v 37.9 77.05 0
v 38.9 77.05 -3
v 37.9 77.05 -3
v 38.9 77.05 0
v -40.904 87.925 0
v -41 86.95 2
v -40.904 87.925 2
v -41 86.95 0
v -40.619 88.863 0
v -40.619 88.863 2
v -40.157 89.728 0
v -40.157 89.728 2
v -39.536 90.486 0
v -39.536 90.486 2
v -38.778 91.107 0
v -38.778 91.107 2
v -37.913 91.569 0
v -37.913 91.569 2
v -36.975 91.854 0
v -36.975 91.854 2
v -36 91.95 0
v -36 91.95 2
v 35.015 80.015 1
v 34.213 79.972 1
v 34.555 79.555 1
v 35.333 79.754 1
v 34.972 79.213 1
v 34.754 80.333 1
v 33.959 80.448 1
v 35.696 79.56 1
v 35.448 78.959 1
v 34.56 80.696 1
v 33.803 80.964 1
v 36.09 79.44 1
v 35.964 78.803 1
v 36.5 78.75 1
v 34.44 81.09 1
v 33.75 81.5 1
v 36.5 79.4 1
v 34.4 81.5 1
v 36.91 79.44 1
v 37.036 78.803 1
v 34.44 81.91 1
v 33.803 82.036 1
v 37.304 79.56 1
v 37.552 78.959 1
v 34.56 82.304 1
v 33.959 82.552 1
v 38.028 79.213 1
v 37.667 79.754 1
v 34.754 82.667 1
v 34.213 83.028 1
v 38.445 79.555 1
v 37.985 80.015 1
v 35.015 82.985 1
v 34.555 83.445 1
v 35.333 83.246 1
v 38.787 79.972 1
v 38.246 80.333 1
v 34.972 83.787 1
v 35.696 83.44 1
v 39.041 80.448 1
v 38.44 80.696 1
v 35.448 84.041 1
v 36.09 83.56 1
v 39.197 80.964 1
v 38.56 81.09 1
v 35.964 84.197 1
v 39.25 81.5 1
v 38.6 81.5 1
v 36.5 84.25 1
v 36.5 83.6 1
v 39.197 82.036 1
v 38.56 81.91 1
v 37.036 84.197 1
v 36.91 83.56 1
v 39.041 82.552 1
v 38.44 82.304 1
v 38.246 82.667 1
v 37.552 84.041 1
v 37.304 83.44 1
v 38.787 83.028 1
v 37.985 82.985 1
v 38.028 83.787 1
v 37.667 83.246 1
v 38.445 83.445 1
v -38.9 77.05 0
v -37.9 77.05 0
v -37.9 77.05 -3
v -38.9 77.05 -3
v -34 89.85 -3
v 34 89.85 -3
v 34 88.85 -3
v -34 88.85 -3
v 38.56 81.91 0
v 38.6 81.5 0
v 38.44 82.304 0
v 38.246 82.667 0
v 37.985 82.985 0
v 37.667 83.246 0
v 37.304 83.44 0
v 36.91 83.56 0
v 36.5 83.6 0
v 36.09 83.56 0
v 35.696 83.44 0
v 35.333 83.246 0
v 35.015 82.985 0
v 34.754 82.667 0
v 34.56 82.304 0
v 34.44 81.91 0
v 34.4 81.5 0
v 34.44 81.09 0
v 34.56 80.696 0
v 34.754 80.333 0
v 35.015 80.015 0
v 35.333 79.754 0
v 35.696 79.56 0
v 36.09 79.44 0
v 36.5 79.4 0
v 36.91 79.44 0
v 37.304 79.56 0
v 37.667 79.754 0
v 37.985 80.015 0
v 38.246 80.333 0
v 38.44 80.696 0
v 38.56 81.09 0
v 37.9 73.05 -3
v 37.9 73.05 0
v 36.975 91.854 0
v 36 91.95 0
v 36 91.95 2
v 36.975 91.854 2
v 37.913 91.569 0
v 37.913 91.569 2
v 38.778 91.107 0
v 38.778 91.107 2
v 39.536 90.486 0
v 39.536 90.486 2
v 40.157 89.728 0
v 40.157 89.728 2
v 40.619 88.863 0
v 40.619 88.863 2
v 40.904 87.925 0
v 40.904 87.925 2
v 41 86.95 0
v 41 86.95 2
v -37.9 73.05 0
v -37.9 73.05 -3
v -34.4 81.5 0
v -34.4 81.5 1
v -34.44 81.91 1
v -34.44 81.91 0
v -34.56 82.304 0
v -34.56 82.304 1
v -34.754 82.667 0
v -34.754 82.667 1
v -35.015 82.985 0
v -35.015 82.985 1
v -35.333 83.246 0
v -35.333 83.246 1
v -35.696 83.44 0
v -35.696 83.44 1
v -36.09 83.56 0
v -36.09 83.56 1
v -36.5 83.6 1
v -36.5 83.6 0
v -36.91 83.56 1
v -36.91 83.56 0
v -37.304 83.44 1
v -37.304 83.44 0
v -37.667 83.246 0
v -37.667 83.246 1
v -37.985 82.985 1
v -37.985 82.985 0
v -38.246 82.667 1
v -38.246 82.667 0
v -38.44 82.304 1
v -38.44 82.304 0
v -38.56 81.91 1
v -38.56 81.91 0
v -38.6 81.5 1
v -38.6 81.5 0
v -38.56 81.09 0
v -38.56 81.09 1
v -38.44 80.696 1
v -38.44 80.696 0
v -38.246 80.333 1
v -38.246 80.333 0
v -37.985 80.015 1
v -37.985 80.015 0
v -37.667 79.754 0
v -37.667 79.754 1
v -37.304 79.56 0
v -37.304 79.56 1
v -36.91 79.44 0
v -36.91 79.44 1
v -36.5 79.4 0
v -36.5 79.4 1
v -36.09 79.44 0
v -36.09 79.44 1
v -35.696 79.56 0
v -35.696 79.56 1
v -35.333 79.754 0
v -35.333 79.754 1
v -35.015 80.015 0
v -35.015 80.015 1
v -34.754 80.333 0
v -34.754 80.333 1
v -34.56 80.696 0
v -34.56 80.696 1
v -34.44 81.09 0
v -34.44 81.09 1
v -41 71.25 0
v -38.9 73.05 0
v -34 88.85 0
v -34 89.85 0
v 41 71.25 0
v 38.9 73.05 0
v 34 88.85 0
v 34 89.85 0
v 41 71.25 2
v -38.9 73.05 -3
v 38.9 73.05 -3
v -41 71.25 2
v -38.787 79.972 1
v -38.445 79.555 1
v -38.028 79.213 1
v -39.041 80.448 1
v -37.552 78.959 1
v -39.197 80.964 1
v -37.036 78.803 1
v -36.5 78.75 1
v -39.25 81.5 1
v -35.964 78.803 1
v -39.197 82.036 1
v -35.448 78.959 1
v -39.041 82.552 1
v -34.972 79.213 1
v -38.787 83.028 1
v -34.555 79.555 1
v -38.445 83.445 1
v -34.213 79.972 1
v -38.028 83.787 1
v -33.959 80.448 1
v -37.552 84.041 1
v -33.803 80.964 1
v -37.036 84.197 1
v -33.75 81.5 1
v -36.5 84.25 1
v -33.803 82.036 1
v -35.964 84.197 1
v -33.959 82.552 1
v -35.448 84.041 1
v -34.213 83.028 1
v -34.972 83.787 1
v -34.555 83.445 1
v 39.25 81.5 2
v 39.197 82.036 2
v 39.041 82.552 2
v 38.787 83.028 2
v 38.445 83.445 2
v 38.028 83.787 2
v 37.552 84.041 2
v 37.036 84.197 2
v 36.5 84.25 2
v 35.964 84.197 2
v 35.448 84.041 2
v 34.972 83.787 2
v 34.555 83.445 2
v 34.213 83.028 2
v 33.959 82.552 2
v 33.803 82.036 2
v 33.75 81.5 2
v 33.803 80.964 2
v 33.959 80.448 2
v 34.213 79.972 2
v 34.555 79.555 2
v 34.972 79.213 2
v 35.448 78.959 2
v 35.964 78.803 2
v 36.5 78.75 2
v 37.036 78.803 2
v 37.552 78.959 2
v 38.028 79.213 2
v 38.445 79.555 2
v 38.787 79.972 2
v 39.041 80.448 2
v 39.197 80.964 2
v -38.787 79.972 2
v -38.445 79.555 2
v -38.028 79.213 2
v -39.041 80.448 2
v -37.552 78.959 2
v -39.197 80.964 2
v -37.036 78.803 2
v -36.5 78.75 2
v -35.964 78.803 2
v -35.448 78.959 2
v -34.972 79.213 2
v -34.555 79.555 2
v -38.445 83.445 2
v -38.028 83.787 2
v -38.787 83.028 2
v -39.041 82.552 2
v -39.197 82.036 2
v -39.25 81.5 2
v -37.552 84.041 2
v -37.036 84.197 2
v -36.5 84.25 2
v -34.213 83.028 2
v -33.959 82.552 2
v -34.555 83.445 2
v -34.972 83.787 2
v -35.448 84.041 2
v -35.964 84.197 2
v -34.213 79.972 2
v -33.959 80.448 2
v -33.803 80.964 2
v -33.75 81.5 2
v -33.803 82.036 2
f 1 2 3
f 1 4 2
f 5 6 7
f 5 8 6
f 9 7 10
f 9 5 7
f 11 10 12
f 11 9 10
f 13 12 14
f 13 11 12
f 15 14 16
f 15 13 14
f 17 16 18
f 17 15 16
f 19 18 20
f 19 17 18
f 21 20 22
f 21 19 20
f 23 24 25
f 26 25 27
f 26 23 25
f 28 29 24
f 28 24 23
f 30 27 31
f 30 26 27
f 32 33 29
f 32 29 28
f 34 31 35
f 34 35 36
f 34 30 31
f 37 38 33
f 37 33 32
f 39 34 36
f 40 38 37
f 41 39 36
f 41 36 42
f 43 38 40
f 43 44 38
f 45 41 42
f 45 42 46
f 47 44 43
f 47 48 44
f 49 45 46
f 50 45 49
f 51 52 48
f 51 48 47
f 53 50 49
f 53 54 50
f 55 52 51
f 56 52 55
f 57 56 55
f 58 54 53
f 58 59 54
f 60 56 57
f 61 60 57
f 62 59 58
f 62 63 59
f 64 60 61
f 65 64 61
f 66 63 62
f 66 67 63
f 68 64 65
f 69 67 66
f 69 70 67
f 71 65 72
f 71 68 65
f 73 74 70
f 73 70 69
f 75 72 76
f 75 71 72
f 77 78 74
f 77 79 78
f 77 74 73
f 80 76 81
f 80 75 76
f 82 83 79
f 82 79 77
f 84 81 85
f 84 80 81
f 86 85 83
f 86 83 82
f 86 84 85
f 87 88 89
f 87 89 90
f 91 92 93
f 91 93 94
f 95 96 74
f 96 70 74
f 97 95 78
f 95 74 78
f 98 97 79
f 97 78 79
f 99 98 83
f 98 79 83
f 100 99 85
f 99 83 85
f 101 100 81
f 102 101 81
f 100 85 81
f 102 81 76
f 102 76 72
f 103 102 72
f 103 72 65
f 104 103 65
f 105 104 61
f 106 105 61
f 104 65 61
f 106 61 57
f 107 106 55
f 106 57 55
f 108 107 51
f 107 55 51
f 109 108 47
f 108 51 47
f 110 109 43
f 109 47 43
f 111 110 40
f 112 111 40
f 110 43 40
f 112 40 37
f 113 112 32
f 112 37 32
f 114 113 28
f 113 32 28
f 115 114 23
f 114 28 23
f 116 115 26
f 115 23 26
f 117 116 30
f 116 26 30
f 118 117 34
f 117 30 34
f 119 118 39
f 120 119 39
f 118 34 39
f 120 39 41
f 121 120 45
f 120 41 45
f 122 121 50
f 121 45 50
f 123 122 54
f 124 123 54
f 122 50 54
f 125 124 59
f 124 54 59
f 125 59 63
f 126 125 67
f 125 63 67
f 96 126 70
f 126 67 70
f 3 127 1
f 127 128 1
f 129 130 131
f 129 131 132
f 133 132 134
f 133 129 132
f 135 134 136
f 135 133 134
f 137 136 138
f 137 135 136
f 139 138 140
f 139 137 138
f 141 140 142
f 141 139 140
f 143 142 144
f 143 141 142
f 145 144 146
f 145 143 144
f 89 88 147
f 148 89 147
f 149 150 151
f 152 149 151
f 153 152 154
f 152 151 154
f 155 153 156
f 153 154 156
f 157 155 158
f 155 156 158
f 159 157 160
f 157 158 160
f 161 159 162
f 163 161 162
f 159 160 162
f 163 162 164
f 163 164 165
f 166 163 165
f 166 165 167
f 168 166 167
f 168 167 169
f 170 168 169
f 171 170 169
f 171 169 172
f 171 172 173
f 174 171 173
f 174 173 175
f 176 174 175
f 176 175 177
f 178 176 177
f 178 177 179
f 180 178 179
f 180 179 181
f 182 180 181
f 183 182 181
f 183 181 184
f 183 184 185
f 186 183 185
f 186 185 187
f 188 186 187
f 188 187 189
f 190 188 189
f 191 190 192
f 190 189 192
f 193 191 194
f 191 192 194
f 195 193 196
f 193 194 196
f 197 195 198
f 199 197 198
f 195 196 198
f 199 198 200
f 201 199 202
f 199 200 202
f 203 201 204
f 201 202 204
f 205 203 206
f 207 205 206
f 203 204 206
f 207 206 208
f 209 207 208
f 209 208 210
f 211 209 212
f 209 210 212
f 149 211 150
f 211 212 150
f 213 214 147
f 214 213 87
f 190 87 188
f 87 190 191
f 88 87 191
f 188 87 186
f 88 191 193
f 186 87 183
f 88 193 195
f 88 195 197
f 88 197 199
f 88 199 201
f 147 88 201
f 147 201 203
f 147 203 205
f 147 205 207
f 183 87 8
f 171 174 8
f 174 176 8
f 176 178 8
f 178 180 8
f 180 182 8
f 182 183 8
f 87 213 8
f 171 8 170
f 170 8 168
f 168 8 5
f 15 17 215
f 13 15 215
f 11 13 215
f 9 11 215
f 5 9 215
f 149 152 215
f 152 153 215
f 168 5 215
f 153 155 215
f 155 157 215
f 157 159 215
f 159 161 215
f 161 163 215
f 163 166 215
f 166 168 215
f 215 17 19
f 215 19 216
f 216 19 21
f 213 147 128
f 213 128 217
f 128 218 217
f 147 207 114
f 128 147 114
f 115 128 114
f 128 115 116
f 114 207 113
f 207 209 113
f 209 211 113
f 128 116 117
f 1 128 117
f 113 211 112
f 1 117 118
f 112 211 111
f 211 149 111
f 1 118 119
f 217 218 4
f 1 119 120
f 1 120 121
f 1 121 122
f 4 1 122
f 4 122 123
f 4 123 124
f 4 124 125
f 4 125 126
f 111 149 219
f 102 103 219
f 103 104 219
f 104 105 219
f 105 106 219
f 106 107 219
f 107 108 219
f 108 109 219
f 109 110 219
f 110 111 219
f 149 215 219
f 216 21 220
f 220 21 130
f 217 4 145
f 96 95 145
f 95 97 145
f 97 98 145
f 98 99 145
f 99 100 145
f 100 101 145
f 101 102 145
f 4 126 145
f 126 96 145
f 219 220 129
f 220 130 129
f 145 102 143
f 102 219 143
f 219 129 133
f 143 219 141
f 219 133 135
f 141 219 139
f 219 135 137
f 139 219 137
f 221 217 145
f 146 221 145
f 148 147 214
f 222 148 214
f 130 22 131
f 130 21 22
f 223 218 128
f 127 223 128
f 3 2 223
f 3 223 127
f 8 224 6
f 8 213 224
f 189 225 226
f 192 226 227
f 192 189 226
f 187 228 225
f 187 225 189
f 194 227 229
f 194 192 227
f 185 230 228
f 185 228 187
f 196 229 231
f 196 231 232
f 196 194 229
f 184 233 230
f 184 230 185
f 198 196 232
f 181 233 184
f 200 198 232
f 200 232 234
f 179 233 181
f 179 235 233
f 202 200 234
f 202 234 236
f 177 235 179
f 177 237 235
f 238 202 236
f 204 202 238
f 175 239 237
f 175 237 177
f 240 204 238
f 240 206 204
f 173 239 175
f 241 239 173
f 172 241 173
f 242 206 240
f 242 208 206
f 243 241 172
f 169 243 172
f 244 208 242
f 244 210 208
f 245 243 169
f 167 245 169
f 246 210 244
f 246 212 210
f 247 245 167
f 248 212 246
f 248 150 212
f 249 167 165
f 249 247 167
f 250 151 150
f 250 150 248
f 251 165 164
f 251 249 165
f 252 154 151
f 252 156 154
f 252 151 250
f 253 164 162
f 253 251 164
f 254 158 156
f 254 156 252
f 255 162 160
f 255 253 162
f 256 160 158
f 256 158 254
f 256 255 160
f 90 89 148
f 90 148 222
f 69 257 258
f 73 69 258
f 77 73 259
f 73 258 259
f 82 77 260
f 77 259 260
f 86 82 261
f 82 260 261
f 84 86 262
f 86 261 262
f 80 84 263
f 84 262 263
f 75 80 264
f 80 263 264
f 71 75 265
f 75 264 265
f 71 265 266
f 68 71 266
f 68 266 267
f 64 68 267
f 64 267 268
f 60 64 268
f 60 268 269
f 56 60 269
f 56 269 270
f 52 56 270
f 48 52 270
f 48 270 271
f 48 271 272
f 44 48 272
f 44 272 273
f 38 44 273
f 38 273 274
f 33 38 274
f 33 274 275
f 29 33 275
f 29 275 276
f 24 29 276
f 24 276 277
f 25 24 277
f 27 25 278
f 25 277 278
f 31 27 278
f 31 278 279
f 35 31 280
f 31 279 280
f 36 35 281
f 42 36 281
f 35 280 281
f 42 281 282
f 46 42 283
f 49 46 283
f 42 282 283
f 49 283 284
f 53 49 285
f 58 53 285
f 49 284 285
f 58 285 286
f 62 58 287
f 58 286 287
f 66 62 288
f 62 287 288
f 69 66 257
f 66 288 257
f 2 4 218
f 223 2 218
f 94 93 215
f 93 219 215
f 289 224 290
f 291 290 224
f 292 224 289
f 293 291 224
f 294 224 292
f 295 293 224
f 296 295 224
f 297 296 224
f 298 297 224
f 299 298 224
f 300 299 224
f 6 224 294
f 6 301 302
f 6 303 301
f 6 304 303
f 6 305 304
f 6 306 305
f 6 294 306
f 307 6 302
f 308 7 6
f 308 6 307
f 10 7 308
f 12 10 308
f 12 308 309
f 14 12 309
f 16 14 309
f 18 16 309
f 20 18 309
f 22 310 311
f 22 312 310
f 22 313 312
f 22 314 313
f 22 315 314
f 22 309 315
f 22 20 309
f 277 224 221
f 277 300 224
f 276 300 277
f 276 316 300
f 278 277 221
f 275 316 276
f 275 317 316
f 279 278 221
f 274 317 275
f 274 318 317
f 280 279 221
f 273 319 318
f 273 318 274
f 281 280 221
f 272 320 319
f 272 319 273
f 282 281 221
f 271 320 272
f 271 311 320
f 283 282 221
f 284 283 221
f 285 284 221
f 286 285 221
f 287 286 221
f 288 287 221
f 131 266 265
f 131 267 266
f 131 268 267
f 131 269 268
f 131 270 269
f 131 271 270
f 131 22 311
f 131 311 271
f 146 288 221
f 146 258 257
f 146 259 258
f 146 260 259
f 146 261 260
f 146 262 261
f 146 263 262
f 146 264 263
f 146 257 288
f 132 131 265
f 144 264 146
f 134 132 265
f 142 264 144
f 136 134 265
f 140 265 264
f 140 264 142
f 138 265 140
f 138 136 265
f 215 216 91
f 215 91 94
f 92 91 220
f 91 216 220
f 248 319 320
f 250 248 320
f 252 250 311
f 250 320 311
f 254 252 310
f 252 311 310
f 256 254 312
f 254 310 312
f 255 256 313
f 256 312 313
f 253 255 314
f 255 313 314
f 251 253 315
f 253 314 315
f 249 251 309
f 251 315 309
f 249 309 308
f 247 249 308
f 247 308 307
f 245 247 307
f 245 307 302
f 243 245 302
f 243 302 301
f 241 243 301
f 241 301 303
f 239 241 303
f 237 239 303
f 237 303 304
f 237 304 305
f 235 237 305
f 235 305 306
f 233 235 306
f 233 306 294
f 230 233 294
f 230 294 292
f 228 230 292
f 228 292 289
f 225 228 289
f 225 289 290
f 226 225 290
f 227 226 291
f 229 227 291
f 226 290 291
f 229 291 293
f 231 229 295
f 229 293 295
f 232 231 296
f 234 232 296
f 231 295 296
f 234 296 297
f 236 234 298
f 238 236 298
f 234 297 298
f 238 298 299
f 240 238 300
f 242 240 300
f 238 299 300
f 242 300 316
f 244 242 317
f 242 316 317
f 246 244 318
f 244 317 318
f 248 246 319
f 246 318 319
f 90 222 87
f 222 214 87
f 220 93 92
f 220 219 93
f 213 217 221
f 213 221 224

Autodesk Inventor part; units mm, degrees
ref_plane "YZ Plane" through (0, 0, 0) normal (1, 0, 0) x (0, 1, 0)
ref_plane "XZ Plane" through (0, 0, 0) normal (0, 1, 0) x (-1, 0, 0)
ref_plane "XY Plane" through (0, 0, 0) normal (0, 0, 1) x (1, 0, 0)
sketch "Sketch1" plane through (0, 0, 0) normal (0, 0, 1) x (1, 0, 0)
  circle A0 centre (0.25, 36.05) radius 28 projected
  line L0 (-21, -56.05) -> (-21, -1.05) projected
  line L1 (-21, -1.05) -> (21.5, -1.05) projected
  line L2 (21.5, -1.05) -> (21.5, -56.05) projected
  line L3 (21.5, -56.05) -> (-21, -56.05) projected
  arc A1 (-41, -66.05) -> (-36, -71.05) centre (-36, -66.05) ccw projected
  line L4 (-36, -71.05) -> (36, -71.05) projected
  arc A2 (36, -71.05) -> (41, -66.05) centre (36, -66.05) ccw projected
  line L5 (41, -66.05) -> (41, 71.05) projected
  line L6 (41, 71.05) -> (-41, 71.05) projected
  line L7 (-41, 71.05) -> (-41, -66.05) projected
  line L8 (20, 69.05) -> (20, 73.05) projected
  line L9 (20, 69.05) -> (33.3542, 69.05) projected
  arc A3 (33.3542, 69.05) -> (39, 63.4042) centre (36, 66.05) ccw projected
  line L10 (39, 63.4042) -> (39, -63.4042) projected
  arc A4 (39, -63.4042) -> (33.3542, -69.05) centre (36, -66.05) ccw projected
  line L11 (33.3542, -69.05) -> (-33.3542, -69.05) projected
  arc A5 (-33.3542, -69.05) -> (-39, -63.4042) centre (-36, -66.05) ccw projected
  line L12 (-39, -63.4042) -> (-39, 63.4042) projected
  arc A6 (-39, 63.4042) -> (-33.3542, 69.05) centre (-36, 66.05) ccw projected
  line L13 (-33.3542, 69.05) -> (-20, 69.05) projected
  line L14 (-20, 69.05) -> (-20, 73.05) projected
  line L15 (-39, 73.05) -> (-20, 73.05) projected
  line L16 (-39, 79.0505) -> (-39, 73.05) projected
  arc A7 (-34, 89.95) -> (-39, 84.95) centre (-34, 84.95) ccw projected
  line L17 (34, 89.95) -> (-34, 89.95) projected
  arc A8 (39, 84.95) -> (34, 89.95) centre (34, 84.95) ccw projected
  line L18 (39, 73.05) -> (39, 79.0505) projected
  line L19 (20, 73.05) -> (39, 73.05) projected
  line L20 (41, -66.05) -> (41, 86.95) projected
  arc A9 (41, 86.95) -> (36, 91.95) centre (36, 86.95) ccw projected
  line L21 (-36, 91.95) -> (36, 91.95) projected
  arc A10 (-36, 91.95) -> (-41, 86.95) centre (-36, 86.95) ccw projected
  line L22 (-41, -66.05) -> (-41, 86.95) projected
  arc A11 (-41, -66.05) -> (-36, -71.05) centre (-36, -66.05) ccw projected
  line L23 (-36, -71.05) -> (36, -71.05) projected
  arc A12 (36, -71.05) -> (41, -66.05) centre (36, -66.05) ccw projected
  circle A13 centre (-36, -66.05) radius 2.1 projected
  line L24 (38.6458, 69.05) -> (39, 69.05) projected
  line L25 (39, 69.05) -> (39, 68.6958) projected
  arc A14 (39, 68.6958) -> (38.6458, 69.05) centre (36, 66.05) ccw projected
  circle A15 centre (36, 66.05) radius 2.1 projected
  line L26 (39, -68.6958) -> (39, -69.05) projected
  line L27 (39, -69.05) -> (38.6458, -69.05) projected
  arc A16 (38.6458, -69.05) -> (39, -68.6958) centre (36, -66.05) ccw projected
  circle A17 centre (36, -66.05) radius 2.1 projected
  arc A18 (-39, -68.6958) -> (-38.6458, -69.05) centre (-36, -66.05) ccw projected
  line L28 (-38.6458, -69.05) -> (-39, -69.05) projected
  line L29 (-39, -69.05) -> (-39, -68.6958) projected
  circle A19 centre (-36, 66.05) radius 2.1 projected
  arc A20 (-38.6458, 69.05) -> (-39, 68.6958) centre (-36, 66.05) ccw projected
  line L30 (-39, 68.6958) -> (-39, 69.05) projected
  line L31 (-39, 69.05) -> (-38.6458, 69.05) projected
  line L32 (41, 71.25) -> (-41, 71.25)
  circle A21 centre (-36.5, 81.5) radius 2.1 projected
  circle A22 centre (36.5, 81.5) radius 2.1 projected
  arc A23 (-39, 79.0505) -> (-39, 83.9495) centre (-36.5, 81.5) ccw projected
  line L33 (-39, 84.95) -> (-39, 83.9495) projected
  line L34 (39, 83.9495) -> (39, 84.95) projected
  arc A24 (39, 83.9495) -> (39, 79.0505) centre (36.5, 81.5) ccw projected
  point P0 (0, 0)
  dimension "d0" = 0.2
extrude "Extrusion1" add sketch "Sketch1" along normal blind 2 contours L22 A10 L21 A9 L20 L32 L8 L19 L18 A24 L34 A8 L17 A7 L33 A23 L16 L15 L14 | L14 L15 L16 A23 L33 A7 L17 A8 L34 A24 L18 L19 L8 L32 | A21 | A22
sketch "Sketch2" plane through (0, 0, 0) normal (0, 0, -1) x (-1, 0, 0)
  arc A0 (-34, 89.95) -> (-39, 79.0505) centre (-34, 84.95) ccw projected
  line L0 (-34, 89.95) -> (34, 89.95) projected
  arc A1 (39, 79.0505) -> (34, 89.95) centre (34, 84.95) ccw projected
  line L1 (39, 79.0505) -> (39, 73.05) projected
  line L2 (-39, 73.05) -> (-39, 79.0505) projected
  line L3 (38.9, 73.05) -> (38.9, 84.95)
  arc A2 (38.9, 84.95) -> (34, 89.85) centre (34, 84.95) ccw
  line L4 (34, 89.85) -> (-34, 89.85)
  arc A3 (-34, 89.85) -> (-38.9, 84.95) centre (-34, 84.95) ccw
  line L5 (-38.9, 84.95) -> (-38.9, 73.05)
  line L6 (-37.9, 73.05) -> (-37.9, 84.95)
  arc A4 (-34, 88.85) -> (-37.9, 84.95) centre (-34, 84.95) ccw
  line L7 (-34, 88.85) -> (34, 88.85)
  arc A5 (37.9, 84.95) -> (34, 88.85) centre (34, 84.95) ccw
  line L8 (37.9, 84.95) -> (37.9, 73.05)
  line L9 (-38.9, 73.05) -> (-37.9, 73.05)
  line L10 (37.9, 73.05) -> (38.9, 73.05)
  line L11 (41, 71.25) -> (-41, 71.25) projected
  arc A6 (-34, 89.95) -> (-39, 84.95) centre (-34, 84.95) ccw projected
  line L12 (-34, 89.95) -> (34, 89.95) projected
  circle A7 centre (-36.5, 81.5) radius 2.1 projected
  arc A8 (-39, 79.0505) -> (-39, 83.9495) centre (-36.5, 81.5) ccw projected
  circle A9 centre (36.5, 81.5) radius 2.1 projected
  arc A10 (39, 83.9495) -> (39, 79.0505) centre (36.5, 81.5) ccw projected
  arc A11 (-36, 91.95) -> (-41, 86.95) centre (-36, 86.95) ccw projected
  line L13 (-41, 71.25) -> (-41, 86.95) projected
  line L14 (-34, 88.85) -> (-34, 89.95)
  line L15 (-38.9, 77.05) -> (38.9, 77.05)
  line L16 (34, 89.95) -> (34, 88.85)
  point P0 (0, 0)
  point P1 (-38.4, 73.05)
  point P2 (38.4, 73.05)
  point P3 (-37.9, 83.0652)
  point P4 (-38.3525, 82.4891)
  point P5 (-37.9, 81.8211)
  point P6 (38.3525, 82.4891)
  point P7 (37.9, 83.0652)
  point P8 (37.9, 81.8211)
  point P9 (-37.9, 77.05)
  point P10 (37.9, 77.05)
  point P11 (34, 89.85)
  dimension "d3" = 0.1
  dimension "d4" = 1
  dimension "d5" = 16.8
  dimension "d6" = 16.8
  dimension "d15" = 2.1
  dimension "d16" = 4
extrude "Extrusion2" add sketch "Sketch2" along normal blind 3 contours L4 L16 L7 L14 | L3 L10 L8 L15 | L15 L6 L9 L5
sketch "Sketch3" plane through (0, 0, 2) normal (0, 0, 1) x (1, 0, 0)
  circle A0 centre (36.5, 81.5) radius 2.1 projected
  circle A1 centre (-36.5, 81.5) radius 2.1 projected
  point P0 (0, 0)
extrude "Extrusion3" cut sketch "Sketch3" against normal blind 3
sketch "Sketch4" plane through (0, 0, 2) normal (0, 0, 1) x (1, 0, 0)
  circle A0 centre (36.5, 81.5) radius 2.1 projected
  circle A1 centre (36.5, 81.5) radius 2.75
  circle A2 centre (-36.5, 81.5) radius 2.1 projected
  circle A3 centre (-36.5, 81.5) radius 2.75
  point P0 (0, 0)
  point P1 (-37.9, 79.9348)
  point P2 (-37.9, 83.0652)
  dimension "d11" = 5.5
  dimension "d12" = 5.5
extrude "Extrusion4" cut sketch "Sketch4" against normal blind 1 contours A0 | A1 | A2 | A3
properties part number "colortop"
